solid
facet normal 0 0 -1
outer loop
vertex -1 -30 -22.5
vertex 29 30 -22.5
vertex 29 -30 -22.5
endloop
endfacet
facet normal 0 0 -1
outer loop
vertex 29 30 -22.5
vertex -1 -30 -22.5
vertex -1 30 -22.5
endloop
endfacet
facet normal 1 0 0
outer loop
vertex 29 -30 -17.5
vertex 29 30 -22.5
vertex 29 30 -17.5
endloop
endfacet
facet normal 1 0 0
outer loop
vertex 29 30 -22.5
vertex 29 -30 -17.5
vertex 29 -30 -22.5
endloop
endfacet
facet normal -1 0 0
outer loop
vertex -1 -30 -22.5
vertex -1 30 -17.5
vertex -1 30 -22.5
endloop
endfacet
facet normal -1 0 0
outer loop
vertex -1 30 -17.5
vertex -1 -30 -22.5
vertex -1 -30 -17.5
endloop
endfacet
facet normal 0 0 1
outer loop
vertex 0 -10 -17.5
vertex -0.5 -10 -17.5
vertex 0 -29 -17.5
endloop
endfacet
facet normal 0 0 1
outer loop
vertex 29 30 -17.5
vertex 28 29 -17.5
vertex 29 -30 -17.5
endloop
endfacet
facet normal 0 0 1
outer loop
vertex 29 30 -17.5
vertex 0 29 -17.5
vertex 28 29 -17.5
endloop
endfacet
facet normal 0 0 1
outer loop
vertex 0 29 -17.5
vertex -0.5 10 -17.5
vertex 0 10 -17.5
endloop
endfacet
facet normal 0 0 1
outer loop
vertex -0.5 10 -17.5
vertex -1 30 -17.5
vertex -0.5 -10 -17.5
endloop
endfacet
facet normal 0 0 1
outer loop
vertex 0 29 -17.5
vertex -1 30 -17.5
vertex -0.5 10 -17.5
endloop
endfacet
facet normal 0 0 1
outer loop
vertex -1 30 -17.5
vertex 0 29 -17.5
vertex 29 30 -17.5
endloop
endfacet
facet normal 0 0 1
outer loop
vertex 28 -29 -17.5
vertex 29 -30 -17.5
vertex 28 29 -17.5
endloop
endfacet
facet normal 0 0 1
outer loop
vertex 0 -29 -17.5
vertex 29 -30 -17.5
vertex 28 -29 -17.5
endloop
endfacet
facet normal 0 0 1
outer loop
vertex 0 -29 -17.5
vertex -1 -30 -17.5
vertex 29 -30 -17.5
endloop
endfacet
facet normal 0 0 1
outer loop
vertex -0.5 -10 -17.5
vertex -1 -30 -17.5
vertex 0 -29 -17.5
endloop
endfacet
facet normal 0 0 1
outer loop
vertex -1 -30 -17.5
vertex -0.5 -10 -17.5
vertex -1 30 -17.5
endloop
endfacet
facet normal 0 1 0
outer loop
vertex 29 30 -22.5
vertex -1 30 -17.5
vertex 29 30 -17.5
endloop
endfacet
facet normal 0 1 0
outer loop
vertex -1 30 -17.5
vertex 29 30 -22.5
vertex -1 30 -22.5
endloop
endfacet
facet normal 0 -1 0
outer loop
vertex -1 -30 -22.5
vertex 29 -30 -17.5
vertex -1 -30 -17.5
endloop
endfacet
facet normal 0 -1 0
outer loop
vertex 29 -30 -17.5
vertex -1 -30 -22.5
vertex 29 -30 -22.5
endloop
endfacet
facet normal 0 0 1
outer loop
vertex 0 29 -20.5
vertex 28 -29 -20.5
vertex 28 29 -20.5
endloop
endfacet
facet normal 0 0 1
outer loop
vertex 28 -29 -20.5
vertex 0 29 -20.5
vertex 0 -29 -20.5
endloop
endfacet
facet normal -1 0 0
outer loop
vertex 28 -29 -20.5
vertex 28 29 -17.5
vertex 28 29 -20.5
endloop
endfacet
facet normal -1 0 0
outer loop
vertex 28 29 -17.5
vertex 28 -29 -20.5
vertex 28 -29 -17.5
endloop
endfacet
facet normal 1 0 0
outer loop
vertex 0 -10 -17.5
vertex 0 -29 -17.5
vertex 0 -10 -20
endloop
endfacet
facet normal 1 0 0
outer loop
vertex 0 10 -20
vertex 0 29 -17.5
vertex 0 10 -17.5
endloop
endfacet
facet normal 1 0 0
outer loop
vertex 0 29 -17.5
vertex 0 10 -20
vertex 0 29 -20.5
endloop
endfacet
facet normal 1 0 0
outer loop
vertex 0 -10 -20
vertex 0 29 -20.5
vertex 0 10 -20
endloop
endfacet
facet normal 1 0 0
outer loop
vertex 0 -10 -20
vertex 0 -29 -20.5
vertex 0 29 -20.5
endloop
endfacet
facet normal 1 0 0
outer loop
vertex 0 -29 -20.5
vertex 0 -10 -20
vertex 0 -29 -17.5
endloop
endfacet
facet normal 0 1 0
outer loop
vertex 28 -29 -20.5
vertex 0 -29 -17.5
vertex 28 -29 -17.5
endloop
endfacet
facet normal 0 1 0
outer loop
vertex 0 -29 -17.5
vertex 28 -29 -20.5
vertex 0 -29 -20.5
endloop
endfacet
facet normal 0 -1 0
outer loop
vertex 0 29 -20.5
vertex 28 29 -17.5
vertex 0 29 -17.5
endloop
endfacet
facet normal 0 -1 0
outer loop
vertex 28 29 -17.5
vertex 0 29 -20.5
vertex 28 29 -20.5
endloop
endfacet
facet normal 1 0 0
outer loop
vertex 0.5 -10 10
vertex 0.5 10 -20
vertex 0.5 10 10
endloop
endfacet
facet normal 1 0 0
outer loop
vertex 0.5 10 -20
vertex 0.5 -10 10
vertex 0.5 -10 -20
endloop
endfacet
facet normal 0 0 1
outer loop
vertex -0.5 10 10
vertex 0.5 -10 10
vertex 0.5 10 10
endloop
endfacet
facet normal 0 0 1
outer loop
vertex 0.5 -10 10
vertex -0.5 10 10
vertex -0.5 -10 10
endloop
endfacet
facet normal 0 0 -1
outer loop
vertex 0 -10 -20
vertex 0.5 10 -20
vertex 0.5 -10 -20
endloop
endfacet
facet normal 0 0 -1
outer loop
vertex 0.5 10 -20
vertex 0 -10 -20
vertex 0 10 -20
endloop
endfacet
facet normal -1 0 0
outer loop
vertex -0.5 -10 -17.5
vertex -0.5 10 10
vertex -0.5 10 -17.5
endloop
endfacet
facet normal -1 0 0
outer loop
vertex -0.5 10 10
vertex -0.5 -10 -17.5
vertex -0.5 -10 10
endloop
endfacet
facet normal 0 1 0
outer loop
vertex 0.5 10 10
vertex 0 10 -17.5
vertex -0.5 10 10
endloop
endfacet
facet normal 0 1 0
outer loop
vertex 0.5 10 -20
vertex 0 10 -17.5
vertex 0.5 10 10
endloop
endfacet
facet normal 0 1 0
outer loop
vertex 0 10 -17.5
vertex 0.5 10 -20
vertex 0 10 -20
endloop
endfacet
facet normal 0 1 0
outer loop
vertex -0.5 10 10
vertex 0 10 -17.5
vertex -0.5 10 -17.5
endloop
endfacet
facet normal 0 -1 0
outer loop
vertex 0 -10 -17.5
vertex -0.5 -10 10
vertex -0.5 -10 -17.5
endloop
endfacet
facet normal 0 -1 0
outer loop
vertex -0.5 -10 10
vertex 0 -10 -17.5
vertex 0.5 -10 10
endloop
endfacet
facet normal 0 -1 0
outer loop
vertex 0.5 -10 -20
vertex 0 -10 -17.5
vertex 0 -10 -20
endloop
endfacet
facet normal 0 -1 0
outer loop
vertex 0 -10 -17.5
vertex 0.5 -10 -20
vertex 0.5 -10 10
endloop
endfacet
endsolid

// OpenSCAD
/*
A hanger for your mobile phone while it is charging.
Date: 19/11/2013
*/

//Frame for connecting the platform with the hook
translate([0,0,-5])
cube(size = [1,20,30], center = true);
//Change Hole radius parameters between 1-14
hole_radius = 15; //[5:14]
//Hook which goes around the charger
difference(){
translate([0,0,17])
rotate([90,0,90])
cylinder(h = 1, r = 15, center = true);

translate([0,0,17])
rotate([90,0,90])
cylinder(h = 1, r = hole_radius, center = true);
}
//Change base width
outer_width = 60;
//Change base length
outer_length = 30;

//Hollowed out base to place phone
difference(){
translate([14,0,-20])
rotate([0,90,0])
cube(size = [5,outer_width,outer_length], center = true);

translate([14,0,-19])
rotate([0,90,0])
cube(size = [3,outer_width-2,outer_length-2], center = true);
}
